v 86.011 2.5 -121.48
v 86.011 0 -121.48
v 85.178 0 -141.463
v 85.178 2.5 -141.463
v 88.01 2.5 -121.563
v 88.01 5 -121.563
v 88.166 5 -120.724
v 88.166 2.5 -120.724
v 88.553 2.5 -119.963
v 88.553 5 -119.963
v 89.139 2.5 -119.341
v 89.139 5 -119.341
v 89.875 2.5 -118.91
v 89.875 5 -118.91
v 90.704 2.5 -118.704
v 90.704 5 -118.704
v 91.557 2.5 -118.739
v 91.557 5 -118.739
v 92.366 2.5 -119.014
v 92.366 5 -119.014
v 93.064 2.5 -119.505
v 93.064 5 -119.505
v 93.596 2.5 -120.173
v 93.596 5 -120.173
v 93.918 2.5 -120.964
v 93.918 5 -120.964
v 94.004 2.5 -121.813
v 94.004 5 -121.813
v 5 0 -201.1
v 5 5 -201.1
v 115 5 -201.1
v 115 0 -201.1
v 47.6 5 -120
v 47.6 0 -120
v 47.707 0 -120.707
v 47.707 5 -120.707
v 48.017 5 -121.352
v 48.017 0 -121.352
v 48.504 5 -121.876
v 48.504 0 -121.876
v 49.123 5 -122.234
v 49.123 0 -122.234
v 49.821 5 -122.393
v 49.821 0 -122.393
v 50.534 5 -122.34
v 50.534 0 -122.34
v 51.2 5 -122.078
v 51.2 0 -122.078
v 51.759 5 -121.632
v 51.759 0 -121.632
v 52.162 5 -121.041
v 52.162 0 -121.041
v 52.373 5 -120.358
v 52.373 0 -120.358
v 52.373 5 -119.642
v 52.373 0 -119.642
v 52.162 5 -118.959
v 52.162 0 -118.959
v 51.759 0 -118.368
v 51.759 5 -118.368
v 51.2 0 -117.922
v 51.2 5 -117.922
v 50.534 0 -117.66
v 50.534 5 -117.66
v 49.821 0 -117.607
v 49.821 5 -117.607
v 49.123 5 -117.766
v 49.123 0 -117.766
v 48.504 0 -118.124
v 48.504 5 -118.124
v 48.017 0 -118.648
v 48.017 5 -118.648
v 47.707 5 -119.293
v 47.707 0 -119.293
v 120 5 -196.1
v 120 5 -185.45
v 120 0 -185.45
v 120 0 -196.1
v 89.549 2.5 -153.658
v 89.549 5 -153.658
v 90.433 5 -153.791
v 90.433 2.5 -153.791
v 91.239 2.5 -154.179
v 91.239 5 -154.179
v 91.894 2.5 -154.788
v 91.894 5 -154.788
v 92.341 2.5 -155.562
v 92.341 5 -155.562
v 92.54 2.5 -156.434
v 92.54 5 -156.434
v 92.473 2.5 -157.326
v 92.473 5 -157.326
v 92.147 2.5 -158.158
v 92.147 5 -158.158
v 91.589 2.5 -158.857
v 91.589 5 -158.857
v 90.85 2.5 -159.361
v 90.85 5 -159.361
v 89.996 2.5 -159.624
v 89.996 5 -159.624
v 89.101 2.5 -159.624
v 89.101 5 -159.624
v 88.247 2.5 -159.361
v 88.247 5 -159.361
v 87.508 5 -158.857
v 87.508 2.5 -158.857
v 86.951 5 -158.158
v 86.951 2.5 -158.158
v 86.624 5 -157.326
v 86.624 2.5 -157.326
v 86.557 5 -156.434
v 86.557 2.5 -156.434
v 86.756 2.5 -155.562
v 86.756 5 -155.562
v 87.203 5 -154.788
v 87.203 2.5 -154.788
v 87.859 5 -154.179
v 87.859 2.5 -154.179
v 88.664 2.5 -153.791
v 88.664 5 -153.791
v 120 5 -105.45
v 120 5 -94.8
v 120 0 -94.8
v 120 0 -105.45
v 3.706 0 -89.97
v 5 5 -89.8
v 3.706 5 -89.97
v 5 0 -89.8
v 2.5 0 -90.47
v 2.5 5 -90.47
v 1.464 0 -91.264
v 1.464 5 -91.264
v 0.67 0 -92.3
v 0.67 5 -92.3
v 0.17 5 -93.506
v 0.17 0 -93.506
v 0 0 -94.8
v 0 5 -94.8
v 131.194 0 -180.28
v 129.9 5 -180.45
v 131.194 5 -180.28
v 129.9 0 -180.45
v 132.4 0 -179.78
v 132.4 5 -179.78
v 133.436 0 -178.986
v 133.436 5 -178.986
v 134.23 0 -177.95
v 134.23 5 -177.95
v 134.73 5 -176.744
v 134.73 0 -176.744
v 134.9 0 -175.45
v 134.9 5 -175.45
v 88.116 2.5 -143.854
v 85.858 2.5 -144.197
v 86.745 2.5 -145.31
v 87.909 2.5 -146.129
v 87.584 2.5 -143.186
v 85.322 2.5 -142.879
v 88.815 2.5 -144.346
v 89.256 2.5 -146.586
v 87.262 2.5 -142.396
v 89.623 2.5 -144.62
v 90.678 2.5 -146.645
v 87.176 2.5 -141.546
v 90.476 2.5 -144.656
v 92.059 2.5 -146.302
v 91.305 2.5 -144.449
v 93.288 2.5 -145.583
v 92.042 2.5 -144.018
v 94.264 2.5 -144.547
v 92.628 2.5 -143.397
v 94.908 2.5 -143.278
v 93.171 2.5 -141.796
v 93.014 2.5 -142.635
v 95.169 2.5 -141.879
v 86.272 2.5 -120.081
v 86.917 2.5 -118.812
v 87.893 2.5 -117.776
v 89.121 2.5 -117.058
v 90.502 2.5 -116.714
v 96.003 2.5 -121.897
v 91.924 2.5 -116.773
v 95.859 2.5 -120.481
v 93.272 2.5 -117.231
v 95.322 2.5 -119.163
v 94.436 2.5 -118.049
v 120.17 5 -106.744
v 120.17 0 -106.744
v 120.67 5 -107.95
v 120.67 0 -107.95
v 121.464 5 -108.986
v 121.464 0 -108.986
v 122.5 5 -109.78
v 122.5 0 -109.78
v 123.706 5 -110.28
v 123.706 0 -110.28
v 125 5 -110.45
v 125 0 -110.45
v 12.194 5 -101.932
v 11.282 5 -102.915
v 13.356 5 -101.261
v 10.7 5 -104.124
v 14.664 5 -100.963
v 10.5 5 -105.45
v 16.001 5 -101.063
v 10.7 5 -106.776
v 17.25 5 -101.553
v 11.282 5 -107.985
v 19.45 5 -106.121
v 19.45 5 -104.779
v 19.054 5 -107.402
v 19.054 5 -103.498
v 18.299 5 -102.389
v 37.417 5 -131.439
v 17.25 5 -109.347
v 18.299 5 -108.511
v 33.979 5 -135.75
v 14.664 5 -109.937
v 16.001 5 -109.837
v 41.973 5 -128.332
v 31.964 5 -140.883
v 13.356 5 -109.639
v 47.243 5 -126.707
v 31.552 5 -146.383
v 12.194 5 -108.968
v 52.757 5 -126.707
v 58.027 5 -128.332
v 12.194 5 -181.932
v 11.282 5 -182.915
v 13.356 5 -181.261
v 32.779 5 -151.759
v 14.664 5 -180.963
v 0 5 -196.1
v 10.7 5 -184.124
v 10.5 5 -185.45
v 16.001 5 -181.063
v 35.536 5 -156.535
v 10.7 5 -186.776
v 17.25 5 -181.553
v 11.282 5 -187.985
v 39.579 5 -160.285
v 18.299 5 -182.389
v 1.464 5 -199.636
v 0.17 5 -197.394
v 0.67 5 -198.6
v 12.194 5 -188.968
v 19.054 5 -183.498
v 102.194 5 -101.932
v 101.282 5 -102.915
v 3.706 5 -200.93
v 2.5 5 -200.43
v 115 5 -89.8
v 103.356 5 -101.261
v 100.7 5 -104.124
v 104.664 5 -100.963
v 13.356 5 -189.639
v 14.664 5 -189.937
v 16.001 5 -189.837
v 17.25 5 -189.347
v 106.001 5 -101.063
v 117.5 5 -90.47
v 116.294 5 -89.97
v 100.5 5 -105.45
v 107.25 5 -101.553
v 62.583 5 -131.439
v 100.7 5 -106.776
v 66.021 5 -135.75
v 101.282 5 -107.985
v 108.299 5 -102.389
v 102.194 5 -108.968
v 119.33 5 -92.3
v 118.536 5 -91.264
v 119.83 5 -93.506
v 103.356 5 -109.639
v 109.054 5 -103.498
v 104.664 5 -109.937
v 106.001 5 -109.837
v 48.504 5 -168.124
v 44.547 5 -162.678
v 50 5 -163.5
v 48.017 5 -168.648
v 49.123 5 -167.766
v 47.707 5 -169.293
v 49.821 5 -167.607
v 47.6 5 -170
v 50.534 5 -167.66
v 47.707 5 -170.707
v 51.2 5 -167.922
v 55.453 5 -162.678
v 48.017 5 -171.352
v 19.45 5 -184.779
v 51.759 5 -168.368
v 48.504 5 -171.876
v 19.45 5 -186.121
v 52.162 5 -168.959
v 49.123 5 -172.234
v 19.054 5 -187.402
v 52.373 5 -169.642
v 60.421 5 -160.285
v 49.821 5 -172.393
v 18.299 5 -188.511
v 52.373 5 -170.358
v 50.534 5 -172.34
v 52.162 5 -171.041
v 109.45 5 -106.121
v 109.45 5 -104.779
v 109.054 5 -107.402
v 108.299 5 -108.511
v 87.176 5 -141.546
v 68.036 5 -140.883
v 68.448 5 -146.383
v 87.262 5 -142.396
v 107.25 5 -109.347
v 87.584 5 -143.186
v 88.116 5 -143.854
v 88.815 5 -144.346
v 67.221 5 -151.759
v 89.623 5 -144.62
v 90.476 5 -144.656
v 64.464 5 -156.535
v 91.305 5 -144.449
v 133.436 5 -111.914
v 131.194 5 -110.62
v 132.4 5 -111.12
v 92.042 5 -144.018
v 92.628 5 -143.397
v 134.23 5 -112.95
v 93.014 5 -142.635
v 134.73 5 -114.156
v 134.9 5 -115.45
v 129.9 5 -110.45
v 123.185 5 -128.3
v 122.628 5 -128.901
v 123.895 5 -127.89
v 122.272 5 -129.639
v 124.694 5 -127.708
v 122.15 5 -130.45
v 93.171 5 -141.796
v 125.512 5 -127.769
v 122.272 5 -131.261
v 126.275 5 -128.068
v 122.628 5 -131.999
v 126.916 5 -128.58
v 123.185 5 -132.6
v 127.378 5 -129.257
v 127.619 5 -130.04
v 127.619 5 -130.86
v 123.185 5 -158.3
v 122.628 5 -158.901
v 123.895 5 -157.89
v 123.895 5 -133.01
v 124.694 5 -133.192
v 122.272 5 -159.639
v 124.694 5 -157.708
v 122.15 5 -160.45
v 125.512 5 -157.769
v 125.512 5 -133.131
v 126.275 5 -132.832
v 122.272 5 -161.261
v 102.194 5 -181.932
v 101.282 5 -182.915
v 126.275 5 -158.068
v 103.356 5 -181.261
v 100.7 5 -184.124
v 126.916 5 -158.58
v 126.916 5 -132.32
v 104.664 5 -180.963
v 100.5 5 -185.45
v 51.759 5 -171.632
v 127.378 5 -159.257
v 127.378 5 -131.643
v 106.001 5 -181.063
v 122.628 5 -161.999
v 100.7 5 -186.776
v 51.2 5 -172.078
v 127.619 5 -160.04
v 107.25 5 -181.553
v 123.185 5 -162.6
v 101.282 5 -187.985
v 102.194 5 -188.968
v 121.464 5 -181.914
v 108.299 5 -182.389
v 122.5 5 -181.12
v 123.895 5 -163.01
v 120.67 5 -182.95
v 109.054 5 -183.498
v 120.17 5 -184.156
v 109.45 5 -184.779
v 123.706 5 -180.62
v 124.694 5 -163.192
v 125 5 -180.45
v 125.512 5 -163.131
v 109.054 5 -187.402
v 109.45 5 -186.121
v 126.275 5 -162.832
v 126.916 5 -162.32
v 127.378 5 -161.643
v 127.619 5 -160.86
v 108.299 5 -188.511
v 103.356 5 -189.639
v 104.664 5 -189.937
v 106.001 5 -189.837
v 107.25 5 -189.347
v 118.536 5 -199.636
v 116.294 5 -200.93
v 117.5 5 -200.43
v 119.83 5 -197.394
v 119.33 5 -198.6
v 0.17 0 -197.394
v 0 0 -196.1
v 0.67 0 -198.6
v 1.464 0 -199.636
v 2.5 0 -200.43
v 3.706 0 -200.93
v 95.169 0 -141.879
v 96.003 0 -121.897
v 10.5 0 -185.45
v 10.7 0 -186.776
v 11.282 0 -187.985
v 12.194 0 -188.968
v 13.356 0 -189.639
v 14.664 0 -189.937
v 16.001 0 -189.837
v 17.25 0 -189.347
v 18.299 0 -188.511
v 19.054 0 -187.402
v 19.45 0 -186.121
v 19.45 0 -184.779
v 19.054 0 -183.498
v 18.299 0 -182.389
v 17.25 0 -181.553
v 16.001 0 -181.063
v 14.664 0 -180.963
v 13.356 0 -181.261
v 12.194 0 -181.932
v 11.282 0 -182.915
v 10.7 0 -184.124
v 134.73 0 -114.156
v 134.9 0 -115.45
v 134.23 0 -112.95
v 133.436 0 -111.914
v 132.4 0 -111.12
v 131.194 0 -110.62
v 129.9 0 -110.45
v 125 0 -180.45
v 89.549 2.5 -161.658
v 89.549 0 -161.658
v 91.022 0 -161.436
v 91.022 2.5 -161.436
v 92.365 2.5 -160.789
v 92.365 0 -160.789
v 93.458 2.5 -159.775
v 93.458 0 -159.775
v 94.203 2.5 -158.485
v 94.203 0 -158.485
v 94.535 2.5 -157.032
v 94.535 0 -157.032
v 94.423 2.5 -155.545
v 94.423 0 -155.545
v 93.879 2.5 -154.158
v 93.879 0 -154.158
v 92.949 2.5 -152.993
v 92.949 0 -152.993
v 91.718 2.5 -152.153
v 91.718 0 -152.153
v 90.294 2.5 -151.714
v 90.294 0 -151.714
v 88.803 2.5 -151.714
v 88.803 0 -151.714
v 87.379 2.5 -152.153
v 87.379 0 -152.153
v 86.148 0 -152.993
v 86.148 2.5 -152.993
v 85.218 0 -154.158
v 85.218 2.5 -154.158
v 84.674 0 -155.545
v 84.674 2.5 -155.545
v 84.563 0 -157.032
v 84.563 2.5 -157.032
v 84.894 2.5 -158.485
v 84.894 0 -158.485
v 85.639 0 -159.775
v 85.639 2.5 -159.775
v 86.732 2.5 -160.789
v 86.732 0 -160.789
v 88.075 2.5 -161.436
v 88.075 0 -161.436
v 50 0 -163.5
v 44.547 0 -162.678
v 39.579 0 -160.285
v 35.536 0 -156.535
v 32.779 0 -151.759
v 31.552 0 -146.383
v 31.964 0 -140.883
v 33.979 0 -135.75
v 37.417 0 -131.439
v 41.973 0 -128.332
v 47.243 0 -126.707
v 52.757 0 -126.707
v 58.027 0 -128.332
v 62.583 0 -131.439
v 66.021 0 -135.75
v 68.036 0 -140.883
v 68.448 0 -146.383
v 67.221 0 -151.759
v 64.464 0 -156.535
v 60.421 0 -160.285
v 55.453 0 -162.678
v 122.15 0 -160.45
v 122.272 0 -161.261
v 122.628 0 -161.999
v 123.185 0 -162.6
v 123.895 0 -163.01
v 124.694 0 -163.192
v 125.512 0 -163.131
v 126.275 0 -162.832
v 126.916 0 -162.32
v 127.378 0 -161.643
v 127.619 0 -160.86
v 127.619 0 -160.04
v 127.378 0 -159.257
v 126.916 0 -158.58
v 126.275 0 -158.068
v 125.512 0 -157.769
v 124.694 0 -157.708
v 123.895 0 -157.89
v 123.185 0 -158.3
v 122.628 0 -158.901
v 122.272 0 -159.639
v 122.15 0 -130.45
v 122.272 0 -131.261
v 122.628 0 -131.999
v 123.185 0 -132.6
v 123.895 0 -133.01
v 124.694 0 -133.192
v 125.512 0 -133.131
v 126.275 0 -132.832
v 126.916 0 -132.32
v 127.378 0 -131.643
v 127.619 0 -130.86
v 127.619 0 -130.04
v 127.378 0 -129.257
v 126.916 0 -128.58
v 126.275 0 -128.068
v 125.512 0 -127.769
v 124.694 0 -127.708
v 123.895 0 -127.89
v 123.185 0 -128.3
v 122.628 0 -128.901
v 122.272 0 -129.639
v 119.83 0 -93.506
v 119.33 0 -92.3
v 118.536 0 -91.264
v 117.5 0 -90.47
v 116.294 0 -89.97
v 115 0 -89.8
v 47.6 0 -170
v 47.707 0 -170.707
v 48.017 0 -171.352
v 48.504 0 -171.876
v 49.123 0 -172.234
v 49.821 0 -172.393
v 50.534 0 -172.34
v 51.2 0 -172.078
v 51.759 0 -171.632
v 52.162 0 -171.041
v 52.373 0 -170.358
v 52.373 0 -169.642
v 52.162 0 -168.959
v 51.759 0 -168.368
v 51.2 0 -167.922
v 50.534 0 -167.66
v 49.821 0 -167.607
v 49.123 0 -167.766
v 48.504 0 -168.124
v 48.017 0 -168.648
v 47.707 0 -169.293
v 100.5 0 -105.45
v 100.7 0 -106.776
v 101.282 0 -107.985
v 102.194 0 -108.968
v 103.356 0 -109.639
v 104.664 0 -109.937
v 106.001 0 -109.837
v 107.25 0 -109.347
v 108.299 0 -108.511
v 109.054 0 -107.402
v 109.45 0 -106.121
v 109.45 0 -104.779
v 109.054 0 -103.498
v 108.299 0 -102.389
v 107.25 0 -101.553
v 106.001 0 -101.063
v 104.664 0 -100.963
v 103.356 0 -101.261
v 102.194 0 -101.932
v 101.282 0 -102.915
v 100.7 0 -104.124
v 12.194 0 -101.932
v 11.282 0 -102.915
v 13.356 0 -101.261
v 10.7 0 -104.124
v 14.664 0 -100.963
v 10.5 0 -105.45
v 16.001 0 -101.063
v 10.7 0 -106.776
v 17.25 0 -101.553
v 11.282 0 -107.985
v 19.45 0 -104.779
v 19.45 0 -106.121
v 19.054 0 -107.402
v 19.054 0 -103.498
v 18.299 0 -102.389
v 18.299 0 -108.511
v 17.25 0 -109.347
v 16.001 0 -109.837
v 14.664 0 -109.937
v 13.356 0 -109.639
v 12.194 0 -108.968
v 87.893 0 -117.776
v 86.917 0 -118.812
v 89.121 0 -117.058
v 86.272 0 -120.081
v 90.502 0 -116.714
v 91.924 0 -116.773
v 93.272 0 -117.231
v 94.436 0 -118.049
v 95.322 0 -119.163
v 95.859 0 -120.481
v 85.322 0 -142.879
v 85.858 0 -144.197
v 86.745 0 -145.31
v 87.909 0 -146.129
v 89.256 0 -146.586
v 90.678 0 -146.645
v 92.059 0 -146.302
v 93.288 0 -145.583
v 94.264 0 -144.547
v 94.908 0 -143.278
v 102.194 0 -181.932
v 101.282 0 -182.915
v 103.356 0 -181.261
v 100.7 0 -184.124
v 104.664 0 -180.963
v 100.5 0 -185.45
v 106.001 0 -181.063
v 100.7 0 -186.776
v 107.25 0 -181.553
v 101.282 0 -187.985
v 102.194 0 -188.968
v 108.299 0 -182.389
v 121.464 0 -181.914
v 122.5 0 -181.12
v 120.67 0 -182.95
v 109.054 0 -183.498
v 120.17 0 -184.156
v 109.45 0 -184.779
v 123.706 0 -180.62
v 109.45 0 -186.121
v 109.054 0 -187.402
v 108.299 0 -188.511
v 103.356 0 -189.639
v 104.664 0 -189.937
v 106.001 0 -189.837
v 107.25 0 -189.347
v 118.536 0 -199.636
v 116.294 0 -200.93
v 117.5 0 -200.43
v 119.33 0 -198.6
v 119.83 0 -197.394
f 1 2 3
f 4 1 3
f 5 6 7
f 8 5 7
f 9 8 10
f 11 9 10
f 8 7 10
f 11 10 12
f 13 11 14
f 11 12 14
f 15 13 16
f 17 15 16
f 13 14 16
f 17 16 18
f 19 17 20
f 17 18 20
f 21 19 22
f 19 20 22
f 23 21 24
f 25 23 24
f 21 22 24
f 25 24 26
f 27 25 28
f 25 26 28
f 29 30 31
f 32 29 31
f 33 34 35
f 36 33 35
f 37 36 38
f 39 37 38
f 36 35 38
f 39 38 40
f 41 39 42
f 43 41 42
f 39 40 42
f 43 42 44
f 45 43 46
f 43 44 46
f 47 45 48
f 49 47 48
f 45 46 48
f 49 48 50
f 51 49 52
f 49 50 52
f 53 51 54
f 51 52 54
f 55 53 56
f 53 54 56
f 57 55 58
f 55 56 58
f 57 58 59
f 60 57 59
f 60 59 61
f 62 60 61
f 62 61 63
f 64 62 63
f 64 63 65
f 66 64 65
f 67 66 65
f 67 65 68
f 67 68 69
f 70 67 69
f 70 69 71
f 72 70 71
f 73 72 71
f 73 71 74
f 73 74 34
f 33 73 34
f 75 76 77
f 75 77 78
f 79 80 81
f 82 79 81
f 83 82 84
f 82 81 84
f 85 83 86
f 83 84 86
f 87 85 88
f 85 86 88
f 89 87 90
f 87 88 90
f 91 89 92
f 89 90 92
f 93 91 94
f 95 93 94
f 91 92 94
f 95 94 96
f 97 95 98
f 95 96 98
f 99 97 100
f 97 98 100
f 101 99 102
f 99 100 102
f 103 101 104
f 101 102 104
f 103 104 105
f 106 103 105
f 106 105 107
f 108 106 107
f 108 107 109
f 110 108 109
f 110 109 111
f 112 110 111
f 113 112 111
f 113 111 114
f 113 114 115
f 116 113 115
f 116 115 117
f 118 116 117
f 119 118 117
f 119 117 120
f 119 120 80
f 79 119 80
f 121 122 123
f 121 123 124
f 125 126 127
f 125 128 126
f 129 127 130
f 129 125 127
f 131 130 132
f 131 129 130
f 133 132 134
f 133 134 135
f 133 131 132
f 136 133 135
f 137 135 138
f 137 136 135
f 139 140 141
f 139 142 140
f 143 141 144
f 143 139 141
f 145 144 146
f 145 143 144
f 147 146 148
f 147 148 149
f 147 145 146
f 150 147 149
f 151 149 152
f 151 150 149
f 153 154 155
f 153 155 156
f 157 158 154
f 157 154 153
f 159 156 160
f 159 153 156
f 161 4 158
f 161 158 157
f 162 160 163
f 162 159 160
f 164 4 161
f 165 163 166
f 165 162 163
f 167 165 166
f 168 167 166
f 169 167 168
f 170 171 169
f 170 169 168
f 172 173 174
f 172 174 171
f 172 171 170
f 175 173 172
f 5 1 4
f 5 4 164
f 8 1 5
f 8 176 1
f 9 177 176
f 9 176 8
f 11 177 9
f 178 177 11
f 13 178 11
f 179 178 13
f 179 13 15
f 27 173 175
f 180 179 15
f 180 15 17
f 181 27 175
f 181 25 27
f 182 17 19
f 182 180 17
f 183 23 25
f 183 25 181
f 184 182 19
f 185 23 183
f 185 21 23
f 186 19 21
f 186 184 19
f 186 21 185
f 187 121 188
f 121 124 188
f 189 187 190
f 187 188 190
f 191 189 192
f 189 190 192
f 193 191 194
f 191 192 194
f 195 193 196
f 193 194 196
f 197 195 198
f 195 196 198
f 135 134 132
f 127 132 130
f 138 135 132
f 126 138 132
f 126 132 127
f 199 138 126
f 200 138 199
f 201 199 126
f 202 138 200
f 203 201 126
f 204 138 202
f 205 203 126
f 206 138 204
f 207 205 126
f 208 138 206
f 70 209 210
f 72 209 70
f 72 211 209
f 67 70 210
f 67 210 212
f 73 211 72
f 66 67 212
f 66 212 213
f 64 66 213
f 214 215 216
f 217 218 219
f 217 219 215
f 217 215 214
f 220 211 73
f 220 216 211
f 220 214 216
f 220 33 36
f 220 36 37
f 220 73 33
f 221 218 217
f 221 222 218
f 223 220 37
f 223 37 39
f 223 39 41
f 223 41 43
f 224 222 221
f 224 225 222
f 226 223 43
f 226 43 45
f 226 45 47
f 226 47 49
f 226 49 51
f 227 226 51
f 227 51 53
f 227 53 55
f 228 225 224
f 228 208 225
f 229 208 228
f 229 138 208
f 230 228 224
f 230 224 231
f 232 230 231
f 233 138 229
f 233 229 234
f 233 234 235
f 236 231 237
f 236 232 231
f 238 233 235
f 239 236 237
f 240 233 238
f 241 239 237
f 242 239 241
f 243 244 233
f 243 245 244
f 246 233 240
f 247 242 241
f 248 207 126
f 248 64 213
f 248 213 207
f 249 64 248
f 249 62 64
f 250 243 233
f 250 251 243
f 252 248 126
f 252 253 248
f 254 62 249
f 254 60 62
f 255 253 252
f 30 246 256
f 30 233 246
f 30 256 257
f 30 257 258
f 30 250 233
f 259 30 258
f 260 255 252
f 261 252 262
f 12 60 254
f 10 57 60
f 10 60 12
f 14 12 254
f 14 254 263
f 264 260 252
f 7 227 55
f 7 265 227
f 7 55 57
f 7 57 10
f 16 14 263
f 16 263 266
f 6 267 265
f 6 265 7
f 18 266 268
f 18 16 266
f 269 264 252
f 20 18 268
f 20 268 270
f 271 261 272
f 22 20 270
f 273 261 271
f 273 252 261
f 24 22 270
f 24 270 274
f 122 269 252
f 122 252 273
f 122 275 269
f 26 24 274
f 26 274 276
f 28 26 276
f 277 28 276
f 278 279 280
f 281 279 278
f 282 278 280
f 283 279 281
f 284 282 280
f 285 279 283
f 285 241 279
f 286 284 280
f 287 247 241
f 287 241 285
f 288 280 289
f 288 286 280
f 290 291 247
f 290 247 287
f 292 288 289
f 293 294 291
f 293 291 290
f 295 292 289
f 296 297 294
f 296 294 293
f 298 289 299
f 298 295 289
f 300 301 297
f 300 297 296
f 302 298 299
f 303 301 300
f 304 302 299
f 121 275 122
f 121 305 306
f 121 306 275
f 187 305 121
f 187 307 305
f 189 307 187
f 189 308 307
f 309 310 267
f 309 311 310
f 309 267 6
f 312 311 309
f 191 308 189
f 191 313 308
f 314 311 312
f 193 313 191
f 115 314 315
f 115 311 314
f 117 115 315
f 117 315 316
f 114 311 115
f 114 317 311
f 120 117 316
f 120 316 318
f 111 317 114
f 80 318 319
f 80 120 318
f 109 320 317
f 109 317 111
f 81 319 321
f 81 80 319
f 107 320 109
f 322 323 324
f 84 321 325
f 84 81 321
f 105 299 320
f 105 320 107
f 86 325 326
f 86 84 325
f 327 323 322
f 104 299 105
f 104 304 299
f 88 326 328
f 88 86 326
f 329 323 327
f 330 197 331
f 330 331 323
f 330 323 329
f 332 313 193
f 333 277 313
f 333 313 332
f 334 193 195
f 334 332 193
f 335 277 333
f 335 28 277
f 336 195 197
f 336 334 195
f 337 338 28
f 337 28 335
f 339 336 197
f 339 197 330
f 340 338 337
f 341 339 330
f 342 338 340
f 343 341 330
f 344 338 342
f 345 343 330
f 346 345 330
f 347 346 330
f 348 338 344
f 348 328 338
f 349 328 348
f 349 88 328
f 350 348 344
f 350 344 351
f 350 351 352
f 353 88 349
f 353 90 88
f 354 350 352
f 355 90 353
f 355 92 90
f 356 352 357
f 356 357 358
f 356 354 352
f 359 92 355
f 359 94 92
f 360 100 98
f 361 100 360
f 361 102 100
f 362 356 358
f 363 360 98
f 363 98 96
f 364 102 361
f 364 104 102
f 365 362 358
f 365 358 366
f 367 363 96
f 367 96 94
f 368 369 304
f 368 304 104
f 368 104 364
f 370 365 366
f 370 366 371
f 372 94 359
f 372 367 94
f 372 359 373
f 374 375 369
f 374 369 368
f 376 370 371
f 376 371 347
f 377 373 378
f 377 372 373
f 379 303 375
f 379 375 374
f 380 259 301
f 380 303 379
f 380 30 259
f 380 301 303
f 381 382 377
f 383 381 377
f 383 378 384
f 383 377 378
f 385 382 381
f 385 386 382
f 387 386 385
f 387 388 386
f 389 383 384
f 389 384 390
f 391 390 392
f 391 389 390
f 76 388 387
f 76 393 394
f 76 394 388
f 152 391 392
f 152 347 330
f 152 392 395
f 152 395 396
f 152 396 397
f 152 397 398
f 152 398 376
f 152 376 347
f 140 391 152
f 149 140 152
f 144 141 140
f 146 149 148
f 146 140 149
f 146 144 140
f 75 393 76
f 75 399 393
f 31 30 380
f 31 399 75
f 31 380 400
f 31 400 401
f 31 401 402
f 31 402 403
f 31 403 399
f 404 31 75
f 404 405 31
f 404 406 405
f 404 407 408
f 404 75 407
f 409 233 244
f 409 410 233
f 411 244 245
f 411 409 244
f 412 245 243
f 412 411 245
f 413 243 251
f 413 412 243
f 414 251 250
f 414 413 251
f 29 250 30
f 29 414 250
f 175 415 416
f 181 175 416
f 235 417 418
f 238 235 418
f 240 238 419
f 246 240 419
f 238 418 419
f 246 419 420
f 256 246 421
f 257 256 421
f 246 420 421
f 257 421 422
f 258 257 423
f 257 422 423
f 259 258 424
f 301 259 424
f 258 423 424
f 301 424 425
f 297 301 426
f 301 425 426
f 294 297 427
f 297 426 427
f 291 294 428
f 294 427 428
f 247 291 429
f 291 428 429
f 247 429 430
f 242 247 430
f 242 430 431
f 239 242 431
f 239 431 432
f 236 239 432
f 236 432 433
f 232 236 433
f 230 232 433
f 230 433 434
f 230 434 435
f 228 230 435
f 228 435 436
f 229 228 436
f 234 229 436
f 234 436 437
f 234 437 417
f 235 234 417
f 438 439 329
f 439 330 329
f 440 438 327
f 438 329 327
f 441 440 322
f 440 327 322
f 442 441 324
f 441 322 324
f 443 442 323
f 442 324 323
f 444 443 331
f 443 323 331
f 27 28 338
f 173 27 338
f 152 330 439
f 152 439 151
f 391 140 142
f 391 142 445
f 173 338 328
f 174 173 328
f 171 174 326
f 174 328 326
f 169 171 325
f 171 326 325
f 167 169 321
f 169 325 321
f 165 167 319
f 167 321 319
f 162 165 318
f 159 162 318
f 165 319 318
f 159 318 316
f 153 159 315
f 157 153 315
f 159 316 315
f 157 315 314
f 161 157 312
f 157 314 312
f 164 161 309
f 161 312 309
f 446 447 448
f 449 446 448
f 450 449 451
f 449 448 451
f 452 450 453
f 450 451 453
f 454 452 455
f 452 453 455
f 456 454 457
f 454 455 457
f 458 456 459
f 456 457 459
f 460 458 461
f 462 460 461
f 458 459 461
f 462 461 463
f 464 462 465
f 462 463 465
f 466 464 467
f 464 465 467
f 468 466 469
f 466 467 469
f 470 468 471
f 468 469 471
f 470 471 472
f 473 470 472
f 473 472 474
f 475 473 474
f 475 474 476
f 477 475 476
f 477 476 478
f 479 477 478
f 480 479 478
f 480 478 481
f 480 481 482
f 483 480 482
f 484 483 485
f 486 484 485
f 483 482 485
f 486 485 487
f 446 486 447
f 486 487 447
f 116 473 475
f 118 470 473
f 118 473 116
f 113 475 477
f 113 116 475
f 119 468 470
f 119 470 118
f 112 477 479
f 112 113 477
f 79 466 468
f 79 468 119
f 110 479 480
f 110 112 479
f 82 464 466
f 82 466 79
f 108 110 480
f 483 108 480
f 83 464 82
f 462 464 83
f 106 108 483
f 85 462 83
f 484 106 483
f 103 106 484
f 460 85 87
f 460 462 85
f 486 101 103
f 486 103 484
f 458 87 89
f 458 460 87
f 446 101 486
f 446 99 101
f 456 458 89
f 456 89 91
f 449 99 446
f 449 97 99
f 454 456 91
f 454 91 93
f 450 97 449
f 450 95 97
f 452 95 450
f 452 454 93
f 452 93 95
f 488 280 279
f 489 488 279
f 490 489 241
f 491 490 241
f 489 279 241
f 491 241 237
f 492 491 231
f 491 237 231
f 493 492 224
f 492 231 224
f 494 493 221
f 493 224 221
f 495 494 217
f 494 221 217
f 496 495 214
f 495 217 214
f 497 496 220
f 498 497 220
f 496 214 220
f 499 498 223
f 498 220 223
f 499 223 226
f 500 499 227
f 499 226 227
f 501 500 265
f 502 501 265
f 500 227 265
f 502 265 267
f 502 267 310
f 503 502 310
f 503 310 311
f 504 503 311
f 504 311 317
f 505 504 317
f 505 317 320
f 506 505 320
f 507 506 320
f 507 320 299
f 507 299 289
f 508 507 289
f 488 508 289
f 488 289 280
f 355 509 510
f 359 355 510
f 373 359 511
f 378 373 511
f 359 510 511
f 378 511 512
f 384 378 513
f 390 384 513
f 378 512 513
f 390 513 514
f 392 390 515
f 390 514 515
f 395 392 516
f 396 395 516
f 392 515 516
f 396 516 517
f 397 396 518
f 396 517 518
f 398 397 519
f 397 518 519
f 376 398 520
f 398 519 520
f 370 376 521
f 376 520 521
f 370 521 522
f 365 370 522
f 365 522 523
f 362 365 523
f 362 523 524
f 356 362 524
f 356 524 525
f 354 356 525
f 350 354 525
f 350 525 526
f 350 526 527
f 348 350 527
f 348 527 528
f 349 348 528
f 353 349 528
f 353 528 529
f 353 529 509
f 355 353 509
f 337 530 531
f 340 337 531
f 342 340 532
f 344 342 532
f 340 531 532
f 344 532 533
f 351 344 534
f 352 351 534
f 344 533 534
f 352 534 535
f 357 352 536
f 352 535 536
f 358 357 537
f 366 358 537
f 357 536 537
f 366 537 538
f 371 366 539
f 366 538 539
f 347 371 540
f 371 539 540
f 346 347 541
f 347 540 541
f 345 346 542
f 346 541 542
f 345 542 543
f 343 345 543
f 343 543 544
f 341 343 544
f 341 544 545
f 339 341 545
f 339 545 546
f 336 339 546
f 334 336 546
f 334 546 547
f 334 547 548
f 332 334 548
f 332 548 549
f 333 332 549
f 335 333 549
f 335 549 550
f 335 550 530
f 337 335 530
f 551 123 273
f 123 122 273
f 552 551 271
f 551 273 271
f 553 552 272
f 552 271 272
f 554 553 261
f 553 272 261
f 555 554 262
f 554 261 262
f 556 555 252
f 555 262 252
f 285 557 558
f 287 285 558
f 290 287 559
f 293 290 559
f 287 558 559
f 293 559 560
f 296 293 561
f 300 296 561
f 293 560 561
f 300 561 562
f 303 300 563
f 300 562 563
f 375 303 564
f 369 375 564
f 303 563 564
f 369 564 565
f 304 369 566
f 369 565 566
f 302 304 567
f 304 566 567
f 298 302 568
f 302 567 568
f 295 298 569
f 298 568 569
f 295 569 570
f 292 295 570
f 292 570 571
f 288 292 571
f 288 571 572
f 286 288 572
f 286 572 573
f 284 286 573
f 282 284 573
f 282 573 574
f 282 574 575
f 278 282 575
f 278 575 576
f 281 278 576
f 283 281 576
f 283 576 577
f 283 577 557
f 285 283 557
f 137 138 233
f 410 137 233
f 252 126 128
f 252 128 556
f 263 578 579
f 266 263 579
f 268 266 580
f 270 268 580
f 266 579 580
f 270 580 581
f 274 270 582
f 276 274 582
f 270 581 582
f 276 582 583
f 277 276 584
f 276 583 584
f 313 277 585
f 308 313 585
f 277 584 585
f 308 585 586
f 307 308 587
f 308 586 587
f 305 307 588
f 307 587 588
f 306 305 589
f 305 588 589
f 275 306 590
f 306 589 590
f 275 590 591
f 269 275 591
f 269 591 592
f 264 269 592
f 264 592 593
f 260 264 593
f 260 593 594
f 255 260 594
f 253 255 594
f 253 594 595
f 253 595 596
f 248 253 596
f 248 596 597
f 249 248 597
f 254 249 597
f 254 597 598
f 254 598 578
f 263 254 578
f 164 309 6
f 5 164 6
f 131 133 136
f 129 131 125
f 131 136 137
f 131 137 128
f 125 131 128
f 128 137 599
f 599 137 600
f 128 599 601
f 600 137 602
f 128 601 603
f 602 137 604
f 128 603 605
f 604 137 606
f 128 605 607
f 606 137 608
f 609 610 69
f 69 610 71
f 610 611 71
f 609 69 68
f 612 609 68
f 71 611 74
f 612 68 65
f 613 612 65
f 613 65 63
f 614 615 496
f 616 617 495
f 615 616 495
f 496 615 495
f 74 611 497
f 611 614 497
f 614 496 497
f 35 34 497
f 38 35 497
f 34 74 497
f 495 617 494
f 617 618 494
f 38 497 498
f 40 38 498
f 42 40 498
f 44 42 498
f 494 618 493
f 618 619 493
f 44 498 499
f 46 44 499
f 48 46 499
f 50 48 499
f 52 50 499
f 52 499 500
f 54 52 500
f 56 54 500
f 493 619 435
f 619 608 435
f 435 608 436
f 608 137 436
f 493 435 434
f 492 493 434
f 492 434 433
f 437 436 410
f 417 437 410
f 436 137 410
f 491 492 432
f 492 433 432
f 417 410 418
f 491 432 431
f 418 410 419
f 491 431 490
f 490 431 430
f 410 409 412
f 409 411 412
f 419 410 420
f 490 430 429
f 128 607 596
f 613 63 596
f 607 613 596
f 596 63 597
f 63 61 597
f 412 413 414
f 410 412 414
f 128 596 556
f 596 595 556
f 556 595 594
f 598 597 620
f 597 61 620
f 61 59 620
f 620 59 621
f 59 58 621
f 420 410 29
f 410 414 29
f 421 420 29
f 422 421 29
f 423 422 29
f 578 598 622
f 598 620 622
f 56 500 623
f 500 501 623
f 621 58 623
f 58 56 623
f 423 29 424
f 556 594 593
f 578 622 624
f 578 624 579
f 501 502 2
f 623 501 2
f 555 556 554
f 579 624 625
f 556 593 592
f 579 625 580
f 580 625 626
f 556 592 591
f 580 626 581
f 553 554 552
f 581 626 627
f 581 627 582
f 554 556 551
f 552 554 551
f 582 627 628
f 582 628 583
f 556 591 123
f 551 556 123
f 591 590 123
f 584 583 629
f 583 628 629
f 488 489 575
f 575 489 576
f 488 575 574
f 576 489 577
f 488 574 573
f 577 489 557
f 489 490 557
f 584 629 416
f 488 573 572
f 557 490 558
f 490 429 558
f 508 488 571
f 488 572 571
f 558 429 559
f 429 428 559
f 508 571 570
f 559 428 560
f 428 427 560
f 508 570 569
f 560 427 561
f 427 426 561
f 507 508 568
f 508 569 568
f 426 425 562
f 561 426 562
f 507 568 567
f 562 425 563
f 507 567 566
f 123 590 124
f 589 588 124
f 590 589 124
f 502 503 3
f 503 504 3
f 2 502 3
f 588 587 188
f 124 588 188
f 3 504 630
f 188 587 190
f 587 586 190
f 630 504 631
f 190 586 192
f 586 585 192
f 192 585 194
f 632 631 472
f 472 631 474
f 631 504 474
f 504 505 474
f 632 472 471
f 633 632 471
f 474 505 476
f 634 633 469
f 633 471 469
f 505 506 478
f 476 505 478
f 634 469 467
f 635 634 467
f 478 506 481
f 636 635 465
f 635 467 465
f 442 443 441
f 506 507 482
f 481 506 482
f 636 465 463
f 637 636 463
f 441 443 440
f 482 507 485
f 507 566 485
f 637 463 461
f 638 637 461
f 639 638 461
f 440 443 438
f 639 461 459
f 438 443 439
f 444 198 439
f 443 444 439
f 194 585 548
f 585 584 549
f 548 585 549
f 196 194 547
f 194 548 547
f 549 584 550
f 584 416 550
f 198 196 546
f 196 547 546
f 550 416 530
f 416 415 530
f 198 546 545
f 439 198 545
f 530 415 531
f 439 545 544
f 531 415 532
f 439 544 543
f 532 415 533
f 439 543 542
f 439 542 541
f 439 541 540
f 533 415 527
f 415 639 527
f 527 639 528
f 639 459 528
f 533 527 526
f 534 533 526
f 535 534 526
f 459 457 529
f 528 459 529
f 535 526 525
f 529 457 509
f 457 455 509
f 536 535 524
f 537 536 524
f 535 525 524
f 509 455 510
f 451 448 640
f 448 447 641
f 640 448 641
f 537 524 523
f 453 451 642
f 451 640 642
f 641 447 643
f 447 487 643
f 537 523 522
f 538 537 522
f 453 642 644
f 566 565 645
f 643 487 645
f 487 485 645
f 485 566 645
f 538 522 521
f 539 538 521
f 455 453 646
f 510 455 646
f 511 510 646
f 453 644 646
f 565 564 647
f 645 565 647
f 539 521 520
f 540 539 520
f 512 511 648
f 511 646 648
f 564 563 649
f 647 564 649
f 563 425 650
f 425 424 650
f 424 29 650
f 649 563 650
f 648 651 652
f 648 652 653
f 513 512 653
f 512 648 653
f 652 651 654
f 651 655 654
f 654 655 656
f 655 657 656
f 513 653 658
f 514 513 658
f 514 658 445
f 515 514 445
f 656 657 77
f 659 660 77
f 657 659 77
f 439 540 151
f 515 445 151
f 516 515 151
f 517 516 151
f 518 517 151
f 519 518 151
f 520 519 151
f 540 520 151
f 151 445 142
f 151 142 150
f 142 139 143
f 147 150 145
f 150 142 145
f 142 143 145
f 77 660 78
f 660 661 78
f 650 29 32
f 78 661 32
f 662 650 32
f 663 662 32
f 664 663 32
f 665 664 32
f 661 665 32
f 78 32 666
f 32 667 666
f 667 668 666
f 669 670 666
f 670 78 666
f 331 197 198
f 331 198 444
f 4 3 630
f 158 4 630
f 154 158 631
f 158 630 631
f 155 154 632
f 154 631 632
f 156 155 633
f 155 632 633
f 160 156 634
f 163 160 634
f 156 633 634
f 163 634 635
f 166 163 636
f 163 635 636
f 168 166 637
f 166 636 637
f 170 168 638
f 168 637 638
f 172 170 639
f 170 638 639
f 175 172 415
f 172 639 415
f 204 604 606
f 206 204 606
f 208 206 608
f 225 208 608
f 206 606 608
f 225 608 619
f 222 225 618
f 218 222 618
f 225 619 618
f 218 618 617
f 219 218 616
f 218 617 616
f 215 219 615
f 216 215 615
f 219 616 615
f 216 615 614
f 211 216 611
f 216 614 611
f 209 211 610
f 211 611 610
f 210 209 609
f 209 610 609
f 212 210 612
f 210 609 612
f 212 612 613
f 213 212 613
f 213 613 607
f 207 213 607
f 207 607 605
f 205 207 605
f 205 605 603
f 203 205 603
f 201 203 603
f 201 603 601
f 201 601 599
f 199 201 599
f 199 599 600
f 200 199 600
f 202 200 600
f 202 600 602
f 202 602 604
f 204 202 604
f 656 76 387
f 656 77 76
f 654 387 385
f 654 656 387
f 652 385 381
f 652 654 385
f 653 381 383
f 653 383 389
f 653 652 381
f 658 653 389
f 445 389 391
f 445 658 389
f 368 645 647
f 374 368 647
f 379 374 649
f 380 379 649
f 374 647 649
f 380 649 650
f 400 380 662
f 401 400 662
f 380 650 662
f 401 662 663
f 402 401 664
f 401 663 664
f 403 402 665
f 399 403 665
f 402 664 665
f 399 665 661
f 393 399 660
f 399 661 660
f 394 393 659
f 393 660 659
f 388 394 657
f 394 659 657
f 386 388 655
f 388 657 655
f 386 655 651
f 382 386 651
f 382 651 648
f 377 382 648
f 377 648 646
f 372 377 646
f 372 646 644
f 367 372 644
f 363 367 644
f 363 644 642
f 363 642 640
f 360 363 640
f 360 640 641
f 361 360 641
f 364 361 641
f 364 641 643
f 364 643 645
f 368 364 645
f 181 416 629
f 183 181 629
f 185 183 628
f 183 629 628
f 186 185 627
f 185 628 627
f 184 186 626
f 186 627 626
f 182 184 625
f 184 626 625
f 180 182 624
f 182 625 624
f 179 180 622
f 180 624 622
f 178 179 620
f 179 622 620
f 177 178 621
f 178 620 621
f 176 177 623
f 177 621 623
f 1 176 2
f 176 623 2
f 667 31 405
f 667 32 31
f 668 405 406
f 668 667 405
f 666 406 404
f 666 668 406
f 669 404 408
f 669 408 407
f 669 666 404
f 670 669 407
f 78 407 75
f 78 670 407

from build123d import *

# Parameters (mm, degrees)
SKETCH1_W            = 230
SKETCH1_H            = 200
BOSS_EXTRUDE1_DEPTH  = 5
SKETCH2_R            = 15
SKETCH2_R_2          = 14
SKETCH2_R_3          = 10
SKETCH2_R_4          = 18.5
SKETCH2_R_5          = 3
CUT_EXTRUDE1_DEPTH   = 305.836021494
M4_CLEARANCE_HOLE1_D = 4.8
SKETCH5_W            = 20
SKETCH5_H            = 5
CUT_EXTRUDE2_DEPTH   = 305.836021494
SKETCH8_W            = 230
SKETCH8_H            = 89.8
CUT_EXTRUDE4_DEPTH   = 305.836021494
SKETCH16_W           = 120
SKETCH16_H           = 1.1
BOSS_EXTRUDE2_DEPTH  = 5
M8_CLEARANCE_HOLE1_D = 9
CUT_EXTRUDE7_DEPTH   = 306.558848669
M5_CLEARANCE_HOLE2_D = 5.5
FILLET3_R            = 30
SKETCH22_W           = 97.742742711
SKETCH22_H           = 151.745417032
CUT_EXTRUDE8_DEPTH   = 281.162827656
SKETCH23_R           = 5
CUT_EXTRUDE9_DEPTH   = 2.5
FILLET4_R            = 5


with BuildPart() as part:
    # Sketch1 → Boss-Extrude1 (new body)
    with BuildSketch(Plane(origin=(0, 0, 0), x_dir=(1, 0, 0), z_dir=(0, 1, 0))):
        with Locations((115, 100)):
            Rectangle(SKETCH1_W, SKETCH1_H)
    extrude(amount=BOSS_EXTRUDE1_DEPTH)

    # Sketch2 → Cut-Extrude1 (cut, through all)
    with BuildSketch(Plane(origin=(0, 5, 0), x_dir=(1, 0, 0), z_dir=(0, 1, 0))):
        with Locations(Location((50, 60, 0), (0, 0, 270))):
            Circle(SKETCH2_R)
        with Locations(Location((168.717100706, 42.5, 0), (0, 0, 270))):
            Circle(SKETCH2_R_2)
        with Locations(Location((169.895788083, 150, 0), (0, 0, 90))):
            Circle(SKETCH2_R_3)
        with Locations(Location((50, 145, 0), (0, 0, 90))):
            Circle(SKETCH2_R_4)
        with Locations(Location((89.548596028, 156.65798234, 0), (0, 0, 270))):
            Circle(SKETCH2_R_5)
        with BuildLine():
            Line((104.360743639, 72.202850118), (98.527410306, 32.630483216))
            ThreePointArc((98.527410306, 32.630483216), (96.257125294, 30.943531537), (94.570173616, 33.213816549))
            Line((94.570173616, 33.213816549), (100.403506949, 72.786183451))
            ThreePointArc((100.403506949, 72.786183451), (102.673791961, 74.473135129), (104.360743639, 72.202850118))
        make_face()
        with BuildLine():
            Line((94.004324063, 121.813377483), (93.17099073, 141.79600883))
            ThreePointArc((93.17099073, 141.79600883), (90.048596028, 144.668403532), (87.176201326, 141.54600883))
            Line((87.176201326, 141.54600883), (88.009534659, 121.563377483))
            ThreePointArc((88.009534659, 121.563377483), (91.131929361, 118.690982781), (94.004324063, 121.813377483))
        make_face()
    extrude(amount=-CUT_EXTRUDE1_DEPTH, mode=Mode.SUBTRACT)

    # M4 Clearance Hole1 (through all)
    with Locations(Plane(origin=(0, 5, 0), x_dir=(1, 0, 0), z_dir=(0, 1, 0))):
        with Locations((50, 120), (50, 32.5), (168.717100706, 61), (168.717100706, 24), (187.217100706, 42.5), (150.217100706, 42.5), (50, 170)):
            Hole(M4_CLEARANCE_HOLE1_D / 2)

    # Sketch5 → Cut-Extrude2 (cut, through all)
    with BuildSketch(Plane(origin=(0, 5, 0), x_dir=(1, 0, 0), z_dir=(0, 1, 0))):
        with Locations((30, 7.5)):
            Rectangle(SKETCH5_W, SKETCH5_H)
        with Locations((70, 7.5)):
            Rectangle(SKETCH5_W, SKETCH5_H)
        with Locations((110, 7.5)):
            Rectangle(SKETCH5_W, SKETCH5_H)
        with Locations((150, 7.5)):
            Rectangle(SKETCH5_W, SKETCH5_H)
        with Locations((190, 7.5)):
            Rectangle(SKETCH5_W, SKETCH5_H)
    extrude(amount=-CUT_EXTRUDE2_DEPTH, mode=Mode.SUBTRACT)

    # Sketch8 → Cut-Extrude4 (cut, through all)
    with BuildSketch(Plane(origin=(0, 5, 0), x_dir=(1, 0, 0), z_dir=(0, 1, 0))):
        with Locations((115, 44.9)):
            Rectangle(SKETCH8_W, SKETCH8_H)
    extrude(amount=-CUT_EXTRUDE4_DEPTH, mode=Mode.SUBTRACT)

    # Sketch16 → Boss-Extrude2 (add)
    with BuildSketch(Plane(origin=(0, 5, 0), x_dir=(1, 0, 0), z_dir=(0, 1, 0))):
        with Locations((60, 200.55)):
            Rectangle(SKETCH16_W, SKETCH16_H)
    extrude(amount=-BOSS_EXTRUDE2_DEPTH)

    # M8 Clearance Hole1 (through all)
    with Locations(Plane(origin=(0, 5, 0), x_dir=(1, 0, 0), z_dir=(0, 1, 0))):
        with Locations((15, 185.45), (15, 105.45), (105, 105.45), (105, 185.45)):
            Hole(M8_CLEARANCE_HOLE1_D / 2)

    # Sketch18 → Cut-Extrude7 (cut, through all)
    with BuildSketch(Plane(origin=(0, 5, 0), x_dir=(1, 0, 0), z_dir=(0, 1, 0))):
        Polygon((120, 225.92357398), (254.211620271, 225.92357398), (254.211620271, 61.332744885), (120, 61.332744885), (120, 110.45), (195, 110.45), (195, 180.45), (120, 180.45), align=None)
    extrude(amount=-CUT_EXTRUDE7_DEPTH, mode=Mode.SUBTRACT)

    # M5 Clearance Hole2 (through all)
    with Locations(Plane(origin=(0, 5, 0), x_dir=(1, 0, 0), z_dir=(0, 1, 0))):
        with Locations((124.9, 160.45), (124.9, 130.45)):
            Hole(M5_CLEARANCE_HOLE2_D / 2)

    # Fillet3
    fillet3_edges = [part.edges().sort_by_distance(p)[0] for p in [
        (195, 2.5, -110.45),
        (195, 2.5, -180.45),
    ]]
    fillet(fillet3_edges, radius=FILLET3_R)

    # Sketch22 → Cut-Extrude8 (cut, through all)
    with BuildSketch(Plane(origin=(0, 5, 0), x_dir=(1, 0, 0), z_dir=(0, 1, 0))):
        with Locations((183.771371356, 144.05197651)):
            Rectangle(SKETCH22_W, SKETCH22_H)
    extrude(amount=-CUT_EXTRUDE8_DEPTH, mode=Mode.SUBTRACT)

    # Sketch23 → Cut-Extrude9 (cut)
    with BuildSketch(Plane.XZ):
        with Locations(Location((89.548596028, -156.65798234, 0), (0, 0, 270))):
            Circle(SKETCH23_R)
        with BuildLine():
            Line((95.169253864, -141.879342163), (96.002587198, -121.896710816))
            ThreePointArc((96.002587198, -121.896710816), (91.215262694, -116.692719646), (86.011271524, -121.480044149))
            Line((86.011271524, -121.480044149), (85.177938191, -141.462675497))
            ThreePointArc((85.177938191, -141.462675497), (89.965262694, -146.666666667), (95.169253864, -141.879342163))
        make_face()
    extrude(amount=-CUT_EXTRUDE9_DEPTH, mode=Mode.SUBTRACT)

    # Fillet4
    fillet4_edges = [part.edges().sort_by_distance(p)[0] for p in [
        (0, 2.5, -89.8),
        (120, 2.5, -201.1),
        (0, 2.5, -201.1),
        (120, 2.5, -89.8),
        (120, 2.5, -180.45),
        (120, 2.5, -110.45),
        (134.9, 2.5, -180.45),
        (134.9, 2.5, -110.45),
    ]]
    fillet(fillet4_edges, radius=FILLET4_R)


solid = part.part
